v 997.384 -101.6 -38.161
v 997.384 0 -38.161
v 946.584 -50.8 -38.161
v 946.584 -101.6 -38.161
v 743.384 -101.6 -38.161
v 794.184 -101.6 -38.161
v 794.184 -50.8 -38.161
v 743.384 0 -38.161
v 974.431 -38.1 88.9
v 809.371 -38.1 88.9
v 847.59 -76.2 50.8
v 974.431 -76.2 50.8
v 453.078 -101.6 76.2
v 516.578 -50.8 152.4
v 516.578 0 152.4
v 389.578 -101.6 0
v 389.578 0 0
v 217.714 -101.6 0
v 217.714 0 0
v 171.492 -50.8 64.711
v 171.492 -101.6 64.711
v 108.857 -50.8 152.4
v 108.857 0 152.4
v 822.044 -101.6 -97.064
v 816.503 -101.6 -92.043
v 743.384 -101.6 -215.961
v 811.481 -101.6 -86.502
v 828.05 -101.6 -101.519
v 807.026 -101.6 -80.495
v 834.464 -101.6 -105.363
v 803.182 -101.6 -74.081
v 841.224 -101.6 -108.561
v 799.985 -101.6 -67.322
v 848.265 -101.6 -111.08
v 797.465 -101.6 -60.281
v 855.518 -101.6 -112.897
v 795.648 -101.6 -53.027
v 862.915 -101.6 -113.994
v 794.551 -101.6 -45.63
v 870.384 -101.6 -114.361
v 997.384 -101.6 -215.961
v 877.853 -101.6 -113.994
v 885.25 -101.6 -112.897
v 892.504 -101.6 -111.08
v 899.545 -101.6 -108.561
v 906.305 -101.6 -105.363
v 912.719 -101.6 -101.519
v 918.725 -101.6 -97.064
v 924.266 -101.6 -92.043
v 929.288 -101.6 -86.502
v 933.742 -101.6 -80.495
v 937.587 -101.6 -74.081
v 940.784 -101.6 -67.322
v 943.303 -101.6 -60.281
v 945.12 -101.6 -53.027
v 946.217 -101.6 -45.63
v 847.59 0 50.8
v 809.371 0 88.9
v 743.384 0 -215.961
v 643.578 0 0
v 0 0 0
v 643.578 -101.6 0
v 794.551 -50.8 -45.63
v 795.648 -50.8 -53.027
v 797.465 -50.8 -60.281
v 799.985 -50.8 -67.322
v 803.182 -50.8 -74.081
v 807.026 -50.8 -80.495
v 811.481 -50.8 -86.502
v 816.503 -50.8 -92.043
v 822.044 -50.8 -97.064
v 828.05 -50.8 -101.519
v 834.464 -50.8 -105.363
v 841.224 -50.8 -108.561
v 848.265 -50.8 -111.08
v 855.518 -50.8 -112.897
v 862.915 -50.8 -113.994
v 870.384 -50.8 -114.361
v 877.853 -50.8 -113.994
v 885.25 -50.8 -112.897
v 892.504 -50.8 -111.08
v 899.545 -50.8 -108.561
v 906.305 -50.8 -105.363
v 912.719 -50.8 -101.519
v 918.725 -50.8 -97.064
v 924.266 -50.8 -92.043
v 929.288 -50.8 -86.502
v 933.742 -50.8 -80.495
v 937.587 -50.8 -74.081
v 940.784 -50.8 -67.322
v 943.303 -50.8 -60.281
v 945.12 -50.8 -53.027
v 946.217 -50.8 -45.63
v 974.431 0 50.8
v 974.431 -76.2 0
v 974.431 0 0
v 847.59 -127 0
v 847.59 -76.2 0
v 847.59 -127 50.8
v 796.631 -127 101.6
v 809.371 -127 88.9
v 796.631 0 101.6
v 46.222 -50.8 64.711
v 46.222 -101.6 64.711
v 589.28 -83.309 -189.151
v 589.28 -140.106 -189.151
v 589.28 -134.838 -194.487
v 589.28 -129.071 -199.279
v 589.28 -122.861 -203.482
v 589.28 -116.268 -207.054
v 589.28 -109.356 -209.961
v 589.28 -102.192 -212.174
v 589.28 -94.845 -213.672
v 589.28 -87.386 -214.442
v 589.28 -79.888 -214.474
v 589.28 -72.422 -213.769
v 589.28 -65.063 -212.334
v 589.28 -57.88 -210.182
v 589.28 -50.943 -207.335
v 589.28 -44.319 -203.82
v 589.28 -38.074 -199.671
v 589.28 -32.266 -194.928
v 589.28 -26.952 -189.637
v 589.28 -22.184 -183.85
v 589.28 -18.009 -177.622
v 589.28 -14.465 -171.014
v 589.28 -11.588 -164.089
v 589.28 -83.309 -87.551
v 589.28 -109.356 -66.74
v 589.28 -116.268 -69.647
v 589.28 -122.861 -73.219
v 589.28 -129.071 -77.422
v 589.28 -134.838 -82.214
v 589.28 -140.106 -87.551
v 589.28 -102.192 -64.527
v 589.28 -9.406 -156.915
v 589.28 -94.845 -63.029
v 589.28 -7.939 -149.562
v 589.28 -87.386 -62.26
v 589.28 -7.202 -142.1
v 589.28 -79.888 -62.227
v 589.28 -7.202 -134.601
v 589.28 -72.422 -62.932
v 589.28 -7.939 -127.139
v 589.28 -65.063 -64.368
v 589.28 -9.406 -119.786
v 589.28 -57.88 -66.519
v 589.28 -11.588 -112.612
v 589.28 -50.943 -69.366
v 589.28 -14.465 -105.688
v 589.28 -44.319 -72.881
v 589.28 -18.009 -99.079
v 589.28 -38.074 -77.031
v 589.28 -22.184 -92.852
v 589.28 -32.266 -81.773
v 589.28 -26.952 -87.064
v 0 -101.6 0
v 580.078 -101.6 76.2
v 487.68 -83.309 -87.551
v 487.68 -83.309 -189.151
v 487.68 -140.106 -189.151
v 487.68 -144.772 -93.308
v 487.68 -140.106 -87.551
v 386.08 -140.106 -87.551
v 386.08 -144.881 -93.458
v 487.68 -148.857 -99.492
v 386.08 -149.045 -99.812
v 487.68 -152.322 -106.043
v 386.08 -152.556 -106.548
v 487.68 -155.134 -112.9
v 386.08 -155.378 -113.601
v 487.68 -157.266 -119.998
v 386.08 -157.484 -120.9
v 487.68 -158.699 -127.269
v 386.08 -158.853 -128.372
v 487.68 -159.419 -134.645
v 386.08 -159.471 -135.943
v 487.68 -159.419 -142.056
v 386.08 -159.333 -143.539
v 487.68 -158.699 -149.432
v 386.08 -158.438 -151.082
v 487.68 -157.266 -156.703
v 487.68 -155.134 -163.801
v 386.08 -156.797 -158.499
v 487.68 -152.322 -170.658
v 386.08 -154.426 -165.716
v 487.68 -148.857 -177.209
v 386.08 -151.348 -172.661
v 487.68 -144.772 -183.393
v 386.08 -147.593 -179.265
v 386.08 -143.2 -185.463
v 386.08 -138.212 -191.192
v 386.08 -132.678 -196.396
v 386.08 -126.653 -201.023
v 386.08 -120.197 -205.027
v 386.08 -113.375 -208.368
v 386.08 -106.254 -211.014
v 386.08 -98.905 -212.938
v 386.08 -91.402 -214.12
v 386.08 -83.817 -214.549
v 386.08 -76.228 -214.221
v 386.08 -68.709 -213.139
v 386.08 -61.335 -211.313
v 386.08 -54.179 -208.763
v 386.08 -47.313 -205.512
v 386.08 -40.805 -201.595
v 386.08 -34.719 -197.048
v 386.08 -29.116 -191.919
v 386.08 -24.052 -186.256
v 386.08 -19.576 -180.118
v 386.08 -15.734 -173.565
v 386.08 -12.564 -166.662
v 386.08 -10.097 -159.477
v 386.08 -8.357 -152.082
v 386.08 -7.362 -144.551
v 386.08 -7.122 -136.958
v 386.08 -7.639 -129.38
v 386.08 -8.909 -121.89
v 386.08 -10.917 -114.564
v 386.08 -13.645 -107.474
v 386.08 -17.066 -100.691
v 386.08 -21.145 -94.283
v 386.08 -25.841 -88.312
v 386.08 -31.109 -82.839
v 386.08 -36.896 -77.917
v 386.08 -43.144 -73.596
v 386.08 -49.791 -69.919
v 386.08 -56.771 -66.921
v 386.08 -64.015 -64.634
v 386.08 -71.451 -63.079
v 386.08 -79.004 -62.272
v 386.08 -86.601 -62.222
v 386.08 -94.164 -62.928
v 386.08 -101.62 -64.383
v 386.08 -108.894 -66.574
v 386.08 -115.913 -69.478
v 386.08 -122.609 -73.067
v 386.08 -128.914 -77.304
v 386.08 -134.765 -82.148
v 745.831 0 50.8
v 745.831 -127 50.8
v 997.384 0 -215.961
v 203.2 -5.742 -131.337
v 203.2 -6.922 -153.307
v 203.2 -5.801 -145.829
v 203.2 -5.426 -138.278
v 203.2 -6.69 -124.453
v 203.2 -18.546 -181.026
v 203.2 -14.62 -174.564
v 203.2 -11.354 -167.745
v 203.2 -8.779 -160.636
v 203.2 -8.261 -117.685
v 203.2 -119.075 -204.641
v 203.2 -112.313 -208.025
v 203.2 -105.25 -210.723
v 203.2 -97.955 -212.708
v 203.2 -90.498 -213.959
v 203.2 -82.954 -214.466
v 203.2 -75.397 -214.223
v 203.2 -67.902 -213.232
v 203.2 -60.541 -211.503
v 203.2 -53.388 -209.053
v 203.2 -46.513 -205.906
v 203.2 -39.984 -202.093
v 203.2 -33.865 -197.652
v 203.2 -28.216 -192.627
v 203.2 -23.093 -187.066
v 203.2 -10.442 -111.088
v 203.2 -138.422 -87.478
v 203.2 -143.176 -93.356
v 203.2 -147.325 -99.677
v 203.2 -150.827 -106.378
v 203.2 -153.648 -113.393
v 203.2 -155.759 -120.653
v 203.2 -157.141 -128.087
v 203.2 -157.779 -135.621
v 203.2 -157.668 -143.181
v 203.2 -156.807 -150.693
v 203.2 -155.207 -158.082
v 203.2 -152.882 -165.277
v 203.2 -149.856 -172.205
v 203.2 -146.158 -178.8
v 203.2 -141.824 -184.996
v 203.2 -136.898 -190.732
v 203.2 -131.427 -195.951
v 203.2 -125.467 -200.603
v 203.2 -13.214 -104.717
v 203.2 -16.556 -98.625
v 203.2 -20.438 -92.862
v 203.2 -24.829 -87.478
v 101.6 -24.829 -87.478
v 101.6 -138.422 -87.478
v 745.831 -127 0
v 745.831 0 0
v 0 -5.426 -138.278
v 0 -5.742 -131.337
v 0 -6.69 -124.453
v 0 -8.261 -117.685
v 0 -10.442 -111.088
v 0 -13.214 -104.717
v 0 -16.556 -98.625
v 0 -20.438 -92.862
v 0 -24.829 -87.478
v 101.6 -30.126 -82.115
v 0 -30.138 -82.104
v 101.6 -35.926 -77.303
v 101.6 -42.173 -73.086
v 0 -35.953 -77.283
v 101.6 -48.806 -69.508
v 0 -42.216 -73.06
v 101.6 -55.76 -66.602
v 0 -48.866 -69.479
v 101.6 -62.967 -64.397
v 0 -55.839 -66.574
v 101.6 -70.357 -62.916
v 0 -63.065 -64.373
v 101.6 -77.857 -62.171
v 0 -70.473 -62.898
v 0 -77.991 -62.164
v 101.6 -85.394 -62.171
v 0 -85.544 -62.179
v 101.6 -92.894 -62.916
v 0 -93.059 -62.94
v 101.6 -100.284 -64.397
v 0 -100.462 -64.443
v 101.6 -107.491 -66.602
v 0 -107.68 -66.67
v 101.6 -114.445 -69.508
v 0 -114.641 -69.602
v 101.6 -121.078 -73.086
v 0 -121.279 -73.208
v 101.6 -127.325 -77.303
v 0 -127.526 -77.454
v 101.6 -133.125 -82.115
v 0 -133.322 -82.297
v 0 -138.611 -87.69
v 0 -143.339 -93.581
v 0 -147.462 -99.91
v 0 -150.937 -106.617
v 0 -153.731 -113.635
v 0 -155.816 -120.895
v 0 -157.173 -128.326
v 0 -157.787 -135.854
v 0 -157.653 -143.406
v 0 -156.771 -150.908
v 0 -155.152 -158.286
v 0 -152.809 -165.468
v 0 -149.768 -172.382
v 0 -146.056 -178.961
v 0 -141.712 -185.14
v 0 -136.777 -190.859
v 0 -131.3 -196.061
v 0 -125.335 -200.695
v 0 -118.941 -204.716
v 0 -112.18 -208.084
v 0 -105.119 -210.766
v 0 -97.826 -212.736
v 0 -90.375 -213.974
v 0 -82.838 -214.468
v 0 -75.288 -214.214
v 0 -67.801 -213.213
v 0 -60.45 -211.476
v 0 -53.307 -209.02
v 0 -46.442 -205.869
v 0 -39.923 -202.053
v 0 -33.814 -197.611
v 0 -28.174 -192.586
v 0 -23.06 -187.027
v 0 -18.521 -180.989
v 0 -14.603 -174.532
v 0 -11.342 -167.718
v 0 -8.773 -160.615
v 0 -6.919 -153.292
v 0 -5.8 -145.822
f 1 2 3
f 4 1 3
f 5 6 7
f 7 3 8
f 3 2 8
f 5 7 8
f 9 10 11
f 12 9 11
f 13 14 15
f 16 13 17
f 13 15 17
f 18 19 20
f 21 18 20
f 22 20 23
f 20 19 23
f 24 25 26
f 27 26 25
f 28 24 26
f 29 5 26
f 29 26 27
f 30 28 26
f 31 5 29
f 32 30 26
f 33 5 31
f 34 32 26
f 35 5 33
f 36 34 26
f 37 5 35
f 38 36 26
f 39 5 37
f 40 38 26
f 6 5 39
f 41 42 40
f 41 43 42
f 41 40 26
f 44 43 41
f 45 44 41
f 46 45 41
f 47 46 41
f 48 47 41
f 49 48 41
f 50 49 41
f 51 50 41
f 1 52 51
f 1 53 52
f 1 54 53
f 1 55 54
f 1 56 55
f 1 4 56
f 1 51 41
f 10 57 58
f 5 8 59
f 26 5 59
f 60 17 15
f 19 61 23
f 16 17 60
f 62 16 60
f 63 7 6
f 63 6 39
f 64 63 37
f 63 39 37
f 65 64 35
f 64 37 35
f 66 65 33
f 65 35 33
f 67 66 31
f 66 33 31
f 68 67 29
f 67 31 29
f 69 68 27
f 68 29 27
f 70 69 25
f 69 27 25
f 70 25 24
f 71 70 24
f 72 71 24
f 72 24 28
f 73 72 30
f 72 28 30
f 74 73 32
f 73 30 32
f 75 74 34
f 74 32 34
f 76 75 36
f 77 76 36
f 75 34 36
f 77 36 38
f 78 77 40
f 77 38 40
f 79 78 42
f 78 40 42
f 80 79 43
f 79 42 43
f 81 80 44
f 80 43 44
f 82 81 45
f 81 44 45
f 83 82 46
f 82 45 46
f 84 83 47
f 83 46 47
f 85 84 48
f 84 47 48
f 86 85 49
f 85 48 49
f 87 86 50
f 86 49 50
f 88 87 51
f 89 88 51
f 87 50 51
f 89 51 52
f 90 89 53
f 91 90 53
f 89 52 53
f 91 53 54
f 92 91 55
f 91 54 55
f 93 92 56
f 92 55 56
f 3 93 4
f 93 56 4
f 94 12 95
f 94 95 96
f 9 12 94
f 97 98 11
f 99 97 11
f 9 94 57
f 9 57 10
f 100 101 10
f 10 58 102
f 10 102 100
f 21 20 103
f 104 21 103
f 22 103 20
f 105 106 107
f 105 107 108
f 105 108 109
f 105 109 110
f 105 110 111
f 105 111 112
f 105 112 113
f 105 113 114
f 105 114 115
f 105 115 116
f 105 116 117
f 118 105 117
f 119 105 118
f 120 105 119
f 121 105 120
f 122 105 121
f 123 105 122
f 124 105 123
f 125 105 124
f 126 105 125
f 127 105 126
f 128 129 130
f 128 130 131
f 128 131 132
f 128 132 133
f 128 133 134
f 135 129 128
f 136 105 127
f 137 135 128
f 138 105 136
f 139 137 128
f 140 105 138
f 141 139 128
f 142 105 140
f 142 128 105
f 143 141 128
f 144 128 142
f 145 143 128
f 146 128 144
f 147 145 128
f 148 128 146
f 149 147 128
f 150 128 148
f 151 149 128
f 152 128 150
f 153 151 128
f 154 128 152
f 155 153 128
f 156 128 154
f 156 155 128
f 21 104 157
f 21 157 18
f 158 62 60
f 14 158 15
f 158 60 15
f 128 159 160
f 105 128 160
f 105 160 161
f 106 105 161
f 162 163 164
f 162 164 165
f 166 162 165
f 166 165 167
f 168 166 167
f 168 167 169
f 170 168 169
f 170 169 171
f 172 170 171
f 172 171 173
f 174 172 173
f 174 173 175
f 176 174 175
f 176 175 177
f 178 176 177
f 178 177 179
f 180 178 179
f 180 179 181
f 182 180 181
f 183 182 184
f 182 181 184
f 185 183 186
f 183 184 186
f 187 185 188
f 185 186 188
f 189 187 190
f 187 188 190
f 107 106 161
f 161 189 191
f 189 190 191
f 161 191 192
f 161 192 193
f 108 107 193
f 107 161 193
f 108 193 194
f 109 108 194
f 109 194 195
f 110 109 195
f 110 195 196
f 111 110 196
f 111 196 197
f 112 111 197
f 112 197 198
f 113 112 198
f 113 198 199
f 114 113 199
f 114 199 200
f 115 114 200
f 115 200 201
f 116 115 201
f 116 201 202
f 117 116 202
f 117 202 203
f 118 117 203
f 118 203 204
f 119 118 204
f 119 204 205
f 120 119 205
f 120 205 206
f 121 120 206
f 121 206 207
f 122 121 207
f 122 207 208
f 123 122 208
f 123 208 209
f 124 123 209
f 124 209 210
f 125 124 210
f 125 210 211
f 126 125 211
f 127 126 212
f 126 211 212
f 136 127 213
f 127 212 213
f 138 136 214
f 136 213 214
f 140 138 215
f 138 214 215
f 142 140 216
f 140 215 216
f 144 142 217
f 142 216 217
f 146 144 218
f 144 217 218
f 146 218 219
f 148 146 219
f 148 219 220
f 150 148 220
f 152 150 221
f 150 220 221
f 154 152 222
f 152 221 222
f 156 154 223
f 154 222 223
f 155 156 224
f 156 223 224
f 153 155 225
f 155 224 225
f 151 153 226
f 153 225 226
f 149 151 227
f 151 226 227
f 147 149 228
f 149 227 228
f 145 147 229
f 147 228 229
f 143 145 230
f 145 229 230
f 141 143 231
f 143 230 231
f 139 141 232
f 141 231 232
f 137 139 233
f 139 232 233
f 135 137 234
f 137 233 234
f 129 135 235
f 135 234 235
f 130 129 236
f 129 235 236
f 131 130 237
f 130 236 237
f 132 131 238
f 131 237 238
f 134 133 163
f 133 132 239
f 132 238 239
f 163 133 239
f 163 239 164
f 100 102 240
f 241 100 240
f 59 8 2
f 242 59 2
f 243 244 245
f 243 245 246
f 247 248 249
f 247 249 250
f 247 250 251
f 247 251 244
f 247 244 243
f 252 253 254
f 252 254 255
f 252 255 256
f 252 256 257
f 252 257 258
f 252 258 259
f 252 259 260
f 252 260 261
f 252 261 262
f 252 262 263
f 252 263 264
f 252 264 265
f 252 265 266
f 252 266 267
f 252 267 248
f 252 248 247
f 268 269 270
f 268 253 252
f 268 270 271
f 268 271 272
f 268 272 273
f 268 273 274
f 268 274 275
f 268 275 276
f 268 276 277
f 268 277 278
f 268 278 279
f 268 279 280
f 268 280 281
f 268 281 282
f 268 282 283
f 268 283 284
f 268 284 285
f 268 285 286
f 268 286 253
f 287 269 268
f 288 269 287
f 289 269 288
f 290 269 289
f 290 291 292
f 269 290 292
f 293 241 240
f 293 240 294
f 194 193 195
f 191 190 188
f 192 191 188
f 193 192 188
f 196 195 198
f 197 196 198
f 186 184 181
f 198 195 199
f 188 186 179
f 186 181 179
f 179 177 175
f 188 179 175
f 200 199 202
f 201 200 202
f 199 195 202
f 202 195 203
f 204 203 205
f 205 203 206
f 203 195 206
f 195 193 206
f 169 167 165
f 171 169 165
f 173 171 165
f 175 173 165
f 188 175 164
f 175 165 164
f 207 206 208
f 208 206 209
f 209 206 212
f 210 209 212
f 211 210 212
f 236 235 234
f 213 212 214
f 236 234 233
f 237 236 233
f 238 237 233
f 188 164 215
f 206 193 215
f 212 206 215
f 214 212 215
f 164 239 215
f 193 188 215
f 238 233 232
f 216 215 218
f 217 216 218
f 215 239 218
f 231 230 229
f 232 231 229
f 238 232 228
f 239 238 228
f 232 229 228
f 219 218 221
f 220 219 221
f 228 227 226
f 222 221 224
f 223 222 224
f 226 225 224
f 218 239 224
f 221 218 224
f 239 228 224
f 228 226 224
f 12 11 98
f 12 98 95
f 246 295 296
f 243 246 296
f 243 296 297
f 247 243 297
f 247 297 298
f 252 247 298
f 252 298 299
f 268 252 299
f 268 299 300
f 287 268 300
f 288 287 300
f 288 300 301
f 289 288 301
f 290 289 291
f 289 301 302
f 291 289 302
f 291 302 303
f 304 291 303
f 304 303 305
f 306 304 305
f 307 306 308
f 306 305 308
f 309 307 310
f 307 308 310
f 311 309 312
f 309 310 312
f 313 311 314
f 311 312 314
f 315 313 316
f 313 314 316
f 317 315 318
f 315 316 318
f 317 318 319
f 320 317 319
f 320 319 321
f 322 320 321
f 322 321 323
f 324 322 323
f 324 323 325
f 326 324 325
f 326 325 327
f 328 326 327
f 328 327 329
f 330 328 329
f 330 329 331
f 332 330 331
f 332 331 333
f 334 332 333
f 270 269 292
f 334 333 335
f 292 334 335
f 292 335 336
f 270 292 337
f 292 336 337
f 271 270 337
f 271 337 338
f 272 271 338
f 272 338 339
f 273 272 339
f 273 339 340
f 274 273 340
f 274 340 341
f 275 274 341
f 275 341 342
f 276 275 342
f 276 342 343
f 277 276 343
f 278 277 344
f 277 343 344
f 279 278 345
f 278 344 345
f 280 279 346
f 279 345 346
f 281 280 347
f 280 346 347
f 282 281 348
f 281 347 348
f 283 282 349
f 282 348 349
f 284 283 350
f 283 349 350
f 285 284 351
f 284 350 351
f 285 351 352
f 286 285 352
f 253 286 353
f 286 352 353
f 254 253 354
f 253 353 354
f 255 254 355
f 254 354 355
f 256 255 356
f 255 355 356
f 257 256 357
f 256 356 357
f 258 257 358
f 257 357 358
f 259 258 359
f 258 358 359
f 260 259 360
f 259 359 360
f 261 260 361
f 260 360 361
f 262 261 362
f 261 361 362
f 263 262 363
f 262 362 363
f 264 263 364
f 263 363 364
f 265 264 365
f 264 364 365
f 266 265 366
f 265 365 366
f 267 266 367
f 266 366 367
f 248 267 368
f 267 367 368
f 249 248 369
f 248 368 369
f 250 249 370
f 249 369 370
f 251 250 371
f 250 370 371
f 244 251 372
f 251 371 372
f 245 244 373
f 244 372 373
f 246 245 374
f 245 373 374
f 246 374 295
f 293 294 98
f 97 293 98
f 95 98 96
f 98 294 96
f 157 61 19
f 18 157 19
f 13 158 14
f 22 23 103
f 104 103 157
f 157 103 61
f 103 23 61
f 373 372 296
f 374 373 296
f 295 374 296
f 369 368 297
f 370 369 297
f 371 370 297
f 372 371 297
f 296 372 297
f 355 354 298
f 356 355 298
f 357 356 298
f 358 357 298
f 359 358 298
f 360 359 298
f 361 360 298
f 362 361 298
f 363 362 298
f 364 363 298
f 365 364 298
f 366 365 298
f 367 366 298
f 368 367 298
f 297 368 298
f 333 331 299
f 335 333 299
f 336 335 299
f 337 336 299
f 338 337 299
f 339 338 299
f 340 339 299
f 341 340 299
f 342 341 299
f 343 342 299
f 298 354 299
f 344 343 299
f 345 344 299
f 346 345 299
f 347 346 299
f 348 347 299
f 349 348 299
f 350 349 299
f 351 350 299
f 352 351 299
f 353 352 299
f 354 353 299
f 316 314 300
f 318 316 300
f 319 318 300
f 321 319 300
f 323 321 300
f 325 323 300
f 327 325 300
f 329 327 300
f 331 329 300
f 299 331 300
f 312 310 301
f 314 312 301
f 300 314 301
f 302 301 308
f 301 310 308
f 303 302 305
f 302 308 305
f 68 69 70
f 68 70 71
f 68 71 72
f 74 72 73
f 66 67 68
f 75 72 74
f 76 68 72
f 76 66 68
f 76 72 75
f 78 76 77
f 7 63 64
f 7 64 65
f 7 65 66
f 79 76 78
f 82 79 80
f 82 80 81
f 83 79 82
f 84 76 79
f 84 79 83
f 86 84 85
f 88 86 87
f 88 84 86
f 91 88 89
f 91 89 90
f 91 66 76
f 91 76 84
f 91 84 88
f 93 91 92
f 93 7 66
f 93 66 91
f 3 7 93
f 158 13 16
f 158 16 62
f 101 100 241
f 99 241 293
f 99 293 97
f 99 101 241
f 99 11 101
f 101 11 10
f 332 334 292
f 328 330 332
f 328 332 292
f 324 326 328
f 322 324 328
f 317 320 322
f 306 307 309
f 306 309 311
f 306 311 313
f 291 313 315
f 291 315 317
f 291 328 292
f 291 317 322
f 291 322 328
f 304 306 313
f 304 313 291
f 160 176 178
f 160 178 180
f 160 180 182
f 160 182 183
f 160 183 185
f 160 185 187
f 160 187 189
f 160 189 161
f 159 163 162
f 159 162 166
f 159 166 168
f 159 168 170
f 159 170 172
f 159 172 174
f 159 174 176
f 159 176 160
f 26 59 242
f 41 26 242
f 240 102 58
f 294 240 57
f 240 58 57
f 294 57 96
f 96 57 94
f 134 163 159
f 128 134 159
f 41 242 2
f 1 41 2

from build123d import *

# Parameters (mm, degrees)
F1_DEPTH  = 101.6
F2_DEPTH  = 50.8
F4_DEPTH  = 101.6
F8_DEPTH  = 76.2
F10_DEPTH = 127
F9_W      = 126.841150657
F9_H      = 50.8
F11_DEPTH = 76.2
F15_DEPTH = 203.2
F16_DEPTH = 101.6
F19_DEPTH = 203.2
F20_DEPTH = 101.6
F22_DEPTH = 101.6
F24_DEPTH = 50.8


with BuildPart() as f1:
    # F0 (on Front) → F1 (new body)
    with BuildSketch(Plane.XZ):
        Polygon((46.2219970567, 64.7107958794), (0, 0), (217.7142857143, 0), (171.4922886576, 64.7107958794), (108.8571428571, 64.7107958794), align=None)
    extrude(amount=F1_DEPTH)

    # F0 (on Front) → F2 (join)
    with BuildSketch(Plane.XZ):
        Polygon((46.2219970567, 64.7107958794), (0, 0), (217.7142857143, 0), (171.4922886576, 64.7107958794), (108.8571428571, 64.7107958794), align=None)
        Polygon((108.8571428571, 152.4), (46.2219970567, 64.7107958794), (108.8571428571, 64.7107958794), (171.4922886576, 64.7107958794), align=None)
    extrude(amount=F2_DEPTH)


with BuildPart() as f4:
    # F3 (on Front) → F4 (new body)
    with BuildSketch(Plane.XZ):
        Polygon((516.5779400596, 152.4), (389.5779400596, 0), (643.5779400596, 0), align=None)
    extrude(amount=F4_DEPTH)

    # F7 (on 3pt) → F8 (cut, symmetric)
    with BuildSketch(Plane.YZ.offset(516.5779400596)):
        Polygon((-50.8, 152.4), (-101.6, 152.4), (-101.6, 76.2), align=None)
    extrude(amount=F8_DEPTH, both=True, mode=Mode.SUBTRACT)


with BuildPart() as f10:
    # F9 (on Front) → F10 (new body)
    with BuildSketch(Plane.XZ):
        Polygon((745.8310411218, 50.8), (745.8310411218, 0), (847.5898904648, 0), (847.5898904648, 50.8), (809.3707534576, 88.9), (796.6310411218, 101.6), align=None)
    extrude(amount=F10_DEPTH)

    # F9 (on Front) → F11 (join)
    with BuildSketch(Plane.XZ):
        with Locations((911.0104657933, 25.4)):
            Rectangle(F9_W, F9_H)
    extrude(amount=F11_DEPTH)

    # F12 (on face) → F13 (join, up to the next surface of F10)
    with BuildSketch(Plane.YZ.offset(974.4310411218)):
        Polygon((-38.1, 88.9), (-76.2, 50.8), (0, 50.8), align=None)
    extrude(until=Until.NEXT, dir=(-1, 0, 0))


with BuildPart() as f15:
    # F14 (on Right) → F15 (new body)
    with BuildSketch(Plane.YZ):
        with BuildLine():
            ThreePointArc((-138.4216850644, -87.4777510762), (-108.8154016766, -209.4616848292), (-5.4255584359, -138.2777510762))
            ThreePointArc((-5.4255584359, -138.2777510762), (-10.441624683, -111.0879078355), (-24.8294318074, -87.4777510762))
            Line((-24.8294318074, -87.4777510762), (-81.6255584359, -87.4777510762))
            Line((-81.6255584359, -87.4777510762), (-138.4216850644, -87.4777510762))
        make_face()
    extrude(amount=F15_DEPTH)

    # F14 (on Right) → F16 (join)
    with BuildSketch(Plane.YZ):
        with BuildLine():
            Line((-81.6255584359, -87.4777510762), (-24.8294318074, -87.4777510762))
            ThreePointArc((-24.8294318074, -87.4777510762), (-81.6255584359, -62.0777510762), (-138.4216850644, -87.4777510762))
            Line((-138.4216850644, -87.4777510762), (-81.6255584359, -87.4777510762))
        make_face()
    extrude(amount=F16_DEPTH)


with BuildPart() as f19:
    # F18 (on offset) → F19 (new body)
    with BuildSketch(Plane.YZ.offset(386.08)):
        with BuildLine():
            ThreePointArc((-140.1055833345, -189.1506208658), (-56.1196134653, -209.5345546188), (-7.109456706, -138.3506208658))
            ThreePointArc((-7.109456706, -138.3506208658), (-56.1196134653, -67.1666871129), (-140.1055833345, -87.5506208658))
            Line((-140.1055833345, -87.5506208658), (-83.309456706, -87.5506208658))
            Line((-83.309456706, -87.5506208658), (-83.309456706, -189.1506208658))
            Line((-83.309456706, -189.1506208658), (-140.1055833345, -189.1506208658))
        make_face()
    extrude(amount=F19_DEPTH)

    # F18 (on offset) → F20 (join)
    with BuildSketch(Plane.YZ.offset(386.08)):
        with BuildLine():
            Line((-83.309456706, -87.5506208658), (-140.1055833345, -87.5506208658))
            ThreePointArc((-140.1055833345, -87.5506208658), (-159.509456706, -138.3506208658), (-140.1055833345, -189.1506208658))
            Line((-140.1055833345, -189.1506208658), (-83.309456706, -189.1506208658))
            Line((-83.309456706, -189.1506208658), (-83.309456706, -87.5506208658))
        make_face()
    extrude(amount=F20_DEPTH)


with BuildPart() as f22:
    # F21 (on Front) → F22 (new body)
    with BuildSketch(Plane.XZ):
        with BuildLine():
            Line((946.5842827101, -38.1610280335), (794.1842827101, -38.1610280335))
            ThreePointArc((794.1842827101, -38.1610280335), (870.3842827101, -114.3610280335), (946.5842827101, -38.1610280335))
        make_face()
        with BuildLine():
            Line((743.3842827101, -38.1610280335), (743.3842827101, -215.9610280335))
            Line((743.3842827101, -215.9610280335), (997.3842827101, -215.9610280335))
            Line((997.3842827101, -215.9610280335), (997.3842827101, -38.1610280335))
            Line((997.3842827101, -38.1610280335), (946.5842827101, -38.1610280335))
            ThreePointArc((946.5842827101, -38.1610280335), (870.3842827101, -114.3610280335), (794.1842827101, -38.1610280335))
            Line((794.1842827101, -38.1610280335), (743.3842827101, -38.1610280335))
        make_face()
    extrude(amount=F22_DEPTH)

    # F23 (on face) → F24 (cut)
    with BuildSketch(Plane.XZ.offset(101.6)):
        with BuildLine():
            Line((946.5842827101, -38.1610280335), (794.1842827101, -38.1610280335))
            ThreePointArc((794.1842827101, -38.1610280335), (870.3842827101, -114.3610280335), (946.5842827101, -38.1610280335))
        make_face()
    extrude(amount=-F24_DEPTH, mode=Mode.SUBTRACT)


solid = Compound([f1.part, f4.part, f10.part, f15.part, f19.part, f22.part])
